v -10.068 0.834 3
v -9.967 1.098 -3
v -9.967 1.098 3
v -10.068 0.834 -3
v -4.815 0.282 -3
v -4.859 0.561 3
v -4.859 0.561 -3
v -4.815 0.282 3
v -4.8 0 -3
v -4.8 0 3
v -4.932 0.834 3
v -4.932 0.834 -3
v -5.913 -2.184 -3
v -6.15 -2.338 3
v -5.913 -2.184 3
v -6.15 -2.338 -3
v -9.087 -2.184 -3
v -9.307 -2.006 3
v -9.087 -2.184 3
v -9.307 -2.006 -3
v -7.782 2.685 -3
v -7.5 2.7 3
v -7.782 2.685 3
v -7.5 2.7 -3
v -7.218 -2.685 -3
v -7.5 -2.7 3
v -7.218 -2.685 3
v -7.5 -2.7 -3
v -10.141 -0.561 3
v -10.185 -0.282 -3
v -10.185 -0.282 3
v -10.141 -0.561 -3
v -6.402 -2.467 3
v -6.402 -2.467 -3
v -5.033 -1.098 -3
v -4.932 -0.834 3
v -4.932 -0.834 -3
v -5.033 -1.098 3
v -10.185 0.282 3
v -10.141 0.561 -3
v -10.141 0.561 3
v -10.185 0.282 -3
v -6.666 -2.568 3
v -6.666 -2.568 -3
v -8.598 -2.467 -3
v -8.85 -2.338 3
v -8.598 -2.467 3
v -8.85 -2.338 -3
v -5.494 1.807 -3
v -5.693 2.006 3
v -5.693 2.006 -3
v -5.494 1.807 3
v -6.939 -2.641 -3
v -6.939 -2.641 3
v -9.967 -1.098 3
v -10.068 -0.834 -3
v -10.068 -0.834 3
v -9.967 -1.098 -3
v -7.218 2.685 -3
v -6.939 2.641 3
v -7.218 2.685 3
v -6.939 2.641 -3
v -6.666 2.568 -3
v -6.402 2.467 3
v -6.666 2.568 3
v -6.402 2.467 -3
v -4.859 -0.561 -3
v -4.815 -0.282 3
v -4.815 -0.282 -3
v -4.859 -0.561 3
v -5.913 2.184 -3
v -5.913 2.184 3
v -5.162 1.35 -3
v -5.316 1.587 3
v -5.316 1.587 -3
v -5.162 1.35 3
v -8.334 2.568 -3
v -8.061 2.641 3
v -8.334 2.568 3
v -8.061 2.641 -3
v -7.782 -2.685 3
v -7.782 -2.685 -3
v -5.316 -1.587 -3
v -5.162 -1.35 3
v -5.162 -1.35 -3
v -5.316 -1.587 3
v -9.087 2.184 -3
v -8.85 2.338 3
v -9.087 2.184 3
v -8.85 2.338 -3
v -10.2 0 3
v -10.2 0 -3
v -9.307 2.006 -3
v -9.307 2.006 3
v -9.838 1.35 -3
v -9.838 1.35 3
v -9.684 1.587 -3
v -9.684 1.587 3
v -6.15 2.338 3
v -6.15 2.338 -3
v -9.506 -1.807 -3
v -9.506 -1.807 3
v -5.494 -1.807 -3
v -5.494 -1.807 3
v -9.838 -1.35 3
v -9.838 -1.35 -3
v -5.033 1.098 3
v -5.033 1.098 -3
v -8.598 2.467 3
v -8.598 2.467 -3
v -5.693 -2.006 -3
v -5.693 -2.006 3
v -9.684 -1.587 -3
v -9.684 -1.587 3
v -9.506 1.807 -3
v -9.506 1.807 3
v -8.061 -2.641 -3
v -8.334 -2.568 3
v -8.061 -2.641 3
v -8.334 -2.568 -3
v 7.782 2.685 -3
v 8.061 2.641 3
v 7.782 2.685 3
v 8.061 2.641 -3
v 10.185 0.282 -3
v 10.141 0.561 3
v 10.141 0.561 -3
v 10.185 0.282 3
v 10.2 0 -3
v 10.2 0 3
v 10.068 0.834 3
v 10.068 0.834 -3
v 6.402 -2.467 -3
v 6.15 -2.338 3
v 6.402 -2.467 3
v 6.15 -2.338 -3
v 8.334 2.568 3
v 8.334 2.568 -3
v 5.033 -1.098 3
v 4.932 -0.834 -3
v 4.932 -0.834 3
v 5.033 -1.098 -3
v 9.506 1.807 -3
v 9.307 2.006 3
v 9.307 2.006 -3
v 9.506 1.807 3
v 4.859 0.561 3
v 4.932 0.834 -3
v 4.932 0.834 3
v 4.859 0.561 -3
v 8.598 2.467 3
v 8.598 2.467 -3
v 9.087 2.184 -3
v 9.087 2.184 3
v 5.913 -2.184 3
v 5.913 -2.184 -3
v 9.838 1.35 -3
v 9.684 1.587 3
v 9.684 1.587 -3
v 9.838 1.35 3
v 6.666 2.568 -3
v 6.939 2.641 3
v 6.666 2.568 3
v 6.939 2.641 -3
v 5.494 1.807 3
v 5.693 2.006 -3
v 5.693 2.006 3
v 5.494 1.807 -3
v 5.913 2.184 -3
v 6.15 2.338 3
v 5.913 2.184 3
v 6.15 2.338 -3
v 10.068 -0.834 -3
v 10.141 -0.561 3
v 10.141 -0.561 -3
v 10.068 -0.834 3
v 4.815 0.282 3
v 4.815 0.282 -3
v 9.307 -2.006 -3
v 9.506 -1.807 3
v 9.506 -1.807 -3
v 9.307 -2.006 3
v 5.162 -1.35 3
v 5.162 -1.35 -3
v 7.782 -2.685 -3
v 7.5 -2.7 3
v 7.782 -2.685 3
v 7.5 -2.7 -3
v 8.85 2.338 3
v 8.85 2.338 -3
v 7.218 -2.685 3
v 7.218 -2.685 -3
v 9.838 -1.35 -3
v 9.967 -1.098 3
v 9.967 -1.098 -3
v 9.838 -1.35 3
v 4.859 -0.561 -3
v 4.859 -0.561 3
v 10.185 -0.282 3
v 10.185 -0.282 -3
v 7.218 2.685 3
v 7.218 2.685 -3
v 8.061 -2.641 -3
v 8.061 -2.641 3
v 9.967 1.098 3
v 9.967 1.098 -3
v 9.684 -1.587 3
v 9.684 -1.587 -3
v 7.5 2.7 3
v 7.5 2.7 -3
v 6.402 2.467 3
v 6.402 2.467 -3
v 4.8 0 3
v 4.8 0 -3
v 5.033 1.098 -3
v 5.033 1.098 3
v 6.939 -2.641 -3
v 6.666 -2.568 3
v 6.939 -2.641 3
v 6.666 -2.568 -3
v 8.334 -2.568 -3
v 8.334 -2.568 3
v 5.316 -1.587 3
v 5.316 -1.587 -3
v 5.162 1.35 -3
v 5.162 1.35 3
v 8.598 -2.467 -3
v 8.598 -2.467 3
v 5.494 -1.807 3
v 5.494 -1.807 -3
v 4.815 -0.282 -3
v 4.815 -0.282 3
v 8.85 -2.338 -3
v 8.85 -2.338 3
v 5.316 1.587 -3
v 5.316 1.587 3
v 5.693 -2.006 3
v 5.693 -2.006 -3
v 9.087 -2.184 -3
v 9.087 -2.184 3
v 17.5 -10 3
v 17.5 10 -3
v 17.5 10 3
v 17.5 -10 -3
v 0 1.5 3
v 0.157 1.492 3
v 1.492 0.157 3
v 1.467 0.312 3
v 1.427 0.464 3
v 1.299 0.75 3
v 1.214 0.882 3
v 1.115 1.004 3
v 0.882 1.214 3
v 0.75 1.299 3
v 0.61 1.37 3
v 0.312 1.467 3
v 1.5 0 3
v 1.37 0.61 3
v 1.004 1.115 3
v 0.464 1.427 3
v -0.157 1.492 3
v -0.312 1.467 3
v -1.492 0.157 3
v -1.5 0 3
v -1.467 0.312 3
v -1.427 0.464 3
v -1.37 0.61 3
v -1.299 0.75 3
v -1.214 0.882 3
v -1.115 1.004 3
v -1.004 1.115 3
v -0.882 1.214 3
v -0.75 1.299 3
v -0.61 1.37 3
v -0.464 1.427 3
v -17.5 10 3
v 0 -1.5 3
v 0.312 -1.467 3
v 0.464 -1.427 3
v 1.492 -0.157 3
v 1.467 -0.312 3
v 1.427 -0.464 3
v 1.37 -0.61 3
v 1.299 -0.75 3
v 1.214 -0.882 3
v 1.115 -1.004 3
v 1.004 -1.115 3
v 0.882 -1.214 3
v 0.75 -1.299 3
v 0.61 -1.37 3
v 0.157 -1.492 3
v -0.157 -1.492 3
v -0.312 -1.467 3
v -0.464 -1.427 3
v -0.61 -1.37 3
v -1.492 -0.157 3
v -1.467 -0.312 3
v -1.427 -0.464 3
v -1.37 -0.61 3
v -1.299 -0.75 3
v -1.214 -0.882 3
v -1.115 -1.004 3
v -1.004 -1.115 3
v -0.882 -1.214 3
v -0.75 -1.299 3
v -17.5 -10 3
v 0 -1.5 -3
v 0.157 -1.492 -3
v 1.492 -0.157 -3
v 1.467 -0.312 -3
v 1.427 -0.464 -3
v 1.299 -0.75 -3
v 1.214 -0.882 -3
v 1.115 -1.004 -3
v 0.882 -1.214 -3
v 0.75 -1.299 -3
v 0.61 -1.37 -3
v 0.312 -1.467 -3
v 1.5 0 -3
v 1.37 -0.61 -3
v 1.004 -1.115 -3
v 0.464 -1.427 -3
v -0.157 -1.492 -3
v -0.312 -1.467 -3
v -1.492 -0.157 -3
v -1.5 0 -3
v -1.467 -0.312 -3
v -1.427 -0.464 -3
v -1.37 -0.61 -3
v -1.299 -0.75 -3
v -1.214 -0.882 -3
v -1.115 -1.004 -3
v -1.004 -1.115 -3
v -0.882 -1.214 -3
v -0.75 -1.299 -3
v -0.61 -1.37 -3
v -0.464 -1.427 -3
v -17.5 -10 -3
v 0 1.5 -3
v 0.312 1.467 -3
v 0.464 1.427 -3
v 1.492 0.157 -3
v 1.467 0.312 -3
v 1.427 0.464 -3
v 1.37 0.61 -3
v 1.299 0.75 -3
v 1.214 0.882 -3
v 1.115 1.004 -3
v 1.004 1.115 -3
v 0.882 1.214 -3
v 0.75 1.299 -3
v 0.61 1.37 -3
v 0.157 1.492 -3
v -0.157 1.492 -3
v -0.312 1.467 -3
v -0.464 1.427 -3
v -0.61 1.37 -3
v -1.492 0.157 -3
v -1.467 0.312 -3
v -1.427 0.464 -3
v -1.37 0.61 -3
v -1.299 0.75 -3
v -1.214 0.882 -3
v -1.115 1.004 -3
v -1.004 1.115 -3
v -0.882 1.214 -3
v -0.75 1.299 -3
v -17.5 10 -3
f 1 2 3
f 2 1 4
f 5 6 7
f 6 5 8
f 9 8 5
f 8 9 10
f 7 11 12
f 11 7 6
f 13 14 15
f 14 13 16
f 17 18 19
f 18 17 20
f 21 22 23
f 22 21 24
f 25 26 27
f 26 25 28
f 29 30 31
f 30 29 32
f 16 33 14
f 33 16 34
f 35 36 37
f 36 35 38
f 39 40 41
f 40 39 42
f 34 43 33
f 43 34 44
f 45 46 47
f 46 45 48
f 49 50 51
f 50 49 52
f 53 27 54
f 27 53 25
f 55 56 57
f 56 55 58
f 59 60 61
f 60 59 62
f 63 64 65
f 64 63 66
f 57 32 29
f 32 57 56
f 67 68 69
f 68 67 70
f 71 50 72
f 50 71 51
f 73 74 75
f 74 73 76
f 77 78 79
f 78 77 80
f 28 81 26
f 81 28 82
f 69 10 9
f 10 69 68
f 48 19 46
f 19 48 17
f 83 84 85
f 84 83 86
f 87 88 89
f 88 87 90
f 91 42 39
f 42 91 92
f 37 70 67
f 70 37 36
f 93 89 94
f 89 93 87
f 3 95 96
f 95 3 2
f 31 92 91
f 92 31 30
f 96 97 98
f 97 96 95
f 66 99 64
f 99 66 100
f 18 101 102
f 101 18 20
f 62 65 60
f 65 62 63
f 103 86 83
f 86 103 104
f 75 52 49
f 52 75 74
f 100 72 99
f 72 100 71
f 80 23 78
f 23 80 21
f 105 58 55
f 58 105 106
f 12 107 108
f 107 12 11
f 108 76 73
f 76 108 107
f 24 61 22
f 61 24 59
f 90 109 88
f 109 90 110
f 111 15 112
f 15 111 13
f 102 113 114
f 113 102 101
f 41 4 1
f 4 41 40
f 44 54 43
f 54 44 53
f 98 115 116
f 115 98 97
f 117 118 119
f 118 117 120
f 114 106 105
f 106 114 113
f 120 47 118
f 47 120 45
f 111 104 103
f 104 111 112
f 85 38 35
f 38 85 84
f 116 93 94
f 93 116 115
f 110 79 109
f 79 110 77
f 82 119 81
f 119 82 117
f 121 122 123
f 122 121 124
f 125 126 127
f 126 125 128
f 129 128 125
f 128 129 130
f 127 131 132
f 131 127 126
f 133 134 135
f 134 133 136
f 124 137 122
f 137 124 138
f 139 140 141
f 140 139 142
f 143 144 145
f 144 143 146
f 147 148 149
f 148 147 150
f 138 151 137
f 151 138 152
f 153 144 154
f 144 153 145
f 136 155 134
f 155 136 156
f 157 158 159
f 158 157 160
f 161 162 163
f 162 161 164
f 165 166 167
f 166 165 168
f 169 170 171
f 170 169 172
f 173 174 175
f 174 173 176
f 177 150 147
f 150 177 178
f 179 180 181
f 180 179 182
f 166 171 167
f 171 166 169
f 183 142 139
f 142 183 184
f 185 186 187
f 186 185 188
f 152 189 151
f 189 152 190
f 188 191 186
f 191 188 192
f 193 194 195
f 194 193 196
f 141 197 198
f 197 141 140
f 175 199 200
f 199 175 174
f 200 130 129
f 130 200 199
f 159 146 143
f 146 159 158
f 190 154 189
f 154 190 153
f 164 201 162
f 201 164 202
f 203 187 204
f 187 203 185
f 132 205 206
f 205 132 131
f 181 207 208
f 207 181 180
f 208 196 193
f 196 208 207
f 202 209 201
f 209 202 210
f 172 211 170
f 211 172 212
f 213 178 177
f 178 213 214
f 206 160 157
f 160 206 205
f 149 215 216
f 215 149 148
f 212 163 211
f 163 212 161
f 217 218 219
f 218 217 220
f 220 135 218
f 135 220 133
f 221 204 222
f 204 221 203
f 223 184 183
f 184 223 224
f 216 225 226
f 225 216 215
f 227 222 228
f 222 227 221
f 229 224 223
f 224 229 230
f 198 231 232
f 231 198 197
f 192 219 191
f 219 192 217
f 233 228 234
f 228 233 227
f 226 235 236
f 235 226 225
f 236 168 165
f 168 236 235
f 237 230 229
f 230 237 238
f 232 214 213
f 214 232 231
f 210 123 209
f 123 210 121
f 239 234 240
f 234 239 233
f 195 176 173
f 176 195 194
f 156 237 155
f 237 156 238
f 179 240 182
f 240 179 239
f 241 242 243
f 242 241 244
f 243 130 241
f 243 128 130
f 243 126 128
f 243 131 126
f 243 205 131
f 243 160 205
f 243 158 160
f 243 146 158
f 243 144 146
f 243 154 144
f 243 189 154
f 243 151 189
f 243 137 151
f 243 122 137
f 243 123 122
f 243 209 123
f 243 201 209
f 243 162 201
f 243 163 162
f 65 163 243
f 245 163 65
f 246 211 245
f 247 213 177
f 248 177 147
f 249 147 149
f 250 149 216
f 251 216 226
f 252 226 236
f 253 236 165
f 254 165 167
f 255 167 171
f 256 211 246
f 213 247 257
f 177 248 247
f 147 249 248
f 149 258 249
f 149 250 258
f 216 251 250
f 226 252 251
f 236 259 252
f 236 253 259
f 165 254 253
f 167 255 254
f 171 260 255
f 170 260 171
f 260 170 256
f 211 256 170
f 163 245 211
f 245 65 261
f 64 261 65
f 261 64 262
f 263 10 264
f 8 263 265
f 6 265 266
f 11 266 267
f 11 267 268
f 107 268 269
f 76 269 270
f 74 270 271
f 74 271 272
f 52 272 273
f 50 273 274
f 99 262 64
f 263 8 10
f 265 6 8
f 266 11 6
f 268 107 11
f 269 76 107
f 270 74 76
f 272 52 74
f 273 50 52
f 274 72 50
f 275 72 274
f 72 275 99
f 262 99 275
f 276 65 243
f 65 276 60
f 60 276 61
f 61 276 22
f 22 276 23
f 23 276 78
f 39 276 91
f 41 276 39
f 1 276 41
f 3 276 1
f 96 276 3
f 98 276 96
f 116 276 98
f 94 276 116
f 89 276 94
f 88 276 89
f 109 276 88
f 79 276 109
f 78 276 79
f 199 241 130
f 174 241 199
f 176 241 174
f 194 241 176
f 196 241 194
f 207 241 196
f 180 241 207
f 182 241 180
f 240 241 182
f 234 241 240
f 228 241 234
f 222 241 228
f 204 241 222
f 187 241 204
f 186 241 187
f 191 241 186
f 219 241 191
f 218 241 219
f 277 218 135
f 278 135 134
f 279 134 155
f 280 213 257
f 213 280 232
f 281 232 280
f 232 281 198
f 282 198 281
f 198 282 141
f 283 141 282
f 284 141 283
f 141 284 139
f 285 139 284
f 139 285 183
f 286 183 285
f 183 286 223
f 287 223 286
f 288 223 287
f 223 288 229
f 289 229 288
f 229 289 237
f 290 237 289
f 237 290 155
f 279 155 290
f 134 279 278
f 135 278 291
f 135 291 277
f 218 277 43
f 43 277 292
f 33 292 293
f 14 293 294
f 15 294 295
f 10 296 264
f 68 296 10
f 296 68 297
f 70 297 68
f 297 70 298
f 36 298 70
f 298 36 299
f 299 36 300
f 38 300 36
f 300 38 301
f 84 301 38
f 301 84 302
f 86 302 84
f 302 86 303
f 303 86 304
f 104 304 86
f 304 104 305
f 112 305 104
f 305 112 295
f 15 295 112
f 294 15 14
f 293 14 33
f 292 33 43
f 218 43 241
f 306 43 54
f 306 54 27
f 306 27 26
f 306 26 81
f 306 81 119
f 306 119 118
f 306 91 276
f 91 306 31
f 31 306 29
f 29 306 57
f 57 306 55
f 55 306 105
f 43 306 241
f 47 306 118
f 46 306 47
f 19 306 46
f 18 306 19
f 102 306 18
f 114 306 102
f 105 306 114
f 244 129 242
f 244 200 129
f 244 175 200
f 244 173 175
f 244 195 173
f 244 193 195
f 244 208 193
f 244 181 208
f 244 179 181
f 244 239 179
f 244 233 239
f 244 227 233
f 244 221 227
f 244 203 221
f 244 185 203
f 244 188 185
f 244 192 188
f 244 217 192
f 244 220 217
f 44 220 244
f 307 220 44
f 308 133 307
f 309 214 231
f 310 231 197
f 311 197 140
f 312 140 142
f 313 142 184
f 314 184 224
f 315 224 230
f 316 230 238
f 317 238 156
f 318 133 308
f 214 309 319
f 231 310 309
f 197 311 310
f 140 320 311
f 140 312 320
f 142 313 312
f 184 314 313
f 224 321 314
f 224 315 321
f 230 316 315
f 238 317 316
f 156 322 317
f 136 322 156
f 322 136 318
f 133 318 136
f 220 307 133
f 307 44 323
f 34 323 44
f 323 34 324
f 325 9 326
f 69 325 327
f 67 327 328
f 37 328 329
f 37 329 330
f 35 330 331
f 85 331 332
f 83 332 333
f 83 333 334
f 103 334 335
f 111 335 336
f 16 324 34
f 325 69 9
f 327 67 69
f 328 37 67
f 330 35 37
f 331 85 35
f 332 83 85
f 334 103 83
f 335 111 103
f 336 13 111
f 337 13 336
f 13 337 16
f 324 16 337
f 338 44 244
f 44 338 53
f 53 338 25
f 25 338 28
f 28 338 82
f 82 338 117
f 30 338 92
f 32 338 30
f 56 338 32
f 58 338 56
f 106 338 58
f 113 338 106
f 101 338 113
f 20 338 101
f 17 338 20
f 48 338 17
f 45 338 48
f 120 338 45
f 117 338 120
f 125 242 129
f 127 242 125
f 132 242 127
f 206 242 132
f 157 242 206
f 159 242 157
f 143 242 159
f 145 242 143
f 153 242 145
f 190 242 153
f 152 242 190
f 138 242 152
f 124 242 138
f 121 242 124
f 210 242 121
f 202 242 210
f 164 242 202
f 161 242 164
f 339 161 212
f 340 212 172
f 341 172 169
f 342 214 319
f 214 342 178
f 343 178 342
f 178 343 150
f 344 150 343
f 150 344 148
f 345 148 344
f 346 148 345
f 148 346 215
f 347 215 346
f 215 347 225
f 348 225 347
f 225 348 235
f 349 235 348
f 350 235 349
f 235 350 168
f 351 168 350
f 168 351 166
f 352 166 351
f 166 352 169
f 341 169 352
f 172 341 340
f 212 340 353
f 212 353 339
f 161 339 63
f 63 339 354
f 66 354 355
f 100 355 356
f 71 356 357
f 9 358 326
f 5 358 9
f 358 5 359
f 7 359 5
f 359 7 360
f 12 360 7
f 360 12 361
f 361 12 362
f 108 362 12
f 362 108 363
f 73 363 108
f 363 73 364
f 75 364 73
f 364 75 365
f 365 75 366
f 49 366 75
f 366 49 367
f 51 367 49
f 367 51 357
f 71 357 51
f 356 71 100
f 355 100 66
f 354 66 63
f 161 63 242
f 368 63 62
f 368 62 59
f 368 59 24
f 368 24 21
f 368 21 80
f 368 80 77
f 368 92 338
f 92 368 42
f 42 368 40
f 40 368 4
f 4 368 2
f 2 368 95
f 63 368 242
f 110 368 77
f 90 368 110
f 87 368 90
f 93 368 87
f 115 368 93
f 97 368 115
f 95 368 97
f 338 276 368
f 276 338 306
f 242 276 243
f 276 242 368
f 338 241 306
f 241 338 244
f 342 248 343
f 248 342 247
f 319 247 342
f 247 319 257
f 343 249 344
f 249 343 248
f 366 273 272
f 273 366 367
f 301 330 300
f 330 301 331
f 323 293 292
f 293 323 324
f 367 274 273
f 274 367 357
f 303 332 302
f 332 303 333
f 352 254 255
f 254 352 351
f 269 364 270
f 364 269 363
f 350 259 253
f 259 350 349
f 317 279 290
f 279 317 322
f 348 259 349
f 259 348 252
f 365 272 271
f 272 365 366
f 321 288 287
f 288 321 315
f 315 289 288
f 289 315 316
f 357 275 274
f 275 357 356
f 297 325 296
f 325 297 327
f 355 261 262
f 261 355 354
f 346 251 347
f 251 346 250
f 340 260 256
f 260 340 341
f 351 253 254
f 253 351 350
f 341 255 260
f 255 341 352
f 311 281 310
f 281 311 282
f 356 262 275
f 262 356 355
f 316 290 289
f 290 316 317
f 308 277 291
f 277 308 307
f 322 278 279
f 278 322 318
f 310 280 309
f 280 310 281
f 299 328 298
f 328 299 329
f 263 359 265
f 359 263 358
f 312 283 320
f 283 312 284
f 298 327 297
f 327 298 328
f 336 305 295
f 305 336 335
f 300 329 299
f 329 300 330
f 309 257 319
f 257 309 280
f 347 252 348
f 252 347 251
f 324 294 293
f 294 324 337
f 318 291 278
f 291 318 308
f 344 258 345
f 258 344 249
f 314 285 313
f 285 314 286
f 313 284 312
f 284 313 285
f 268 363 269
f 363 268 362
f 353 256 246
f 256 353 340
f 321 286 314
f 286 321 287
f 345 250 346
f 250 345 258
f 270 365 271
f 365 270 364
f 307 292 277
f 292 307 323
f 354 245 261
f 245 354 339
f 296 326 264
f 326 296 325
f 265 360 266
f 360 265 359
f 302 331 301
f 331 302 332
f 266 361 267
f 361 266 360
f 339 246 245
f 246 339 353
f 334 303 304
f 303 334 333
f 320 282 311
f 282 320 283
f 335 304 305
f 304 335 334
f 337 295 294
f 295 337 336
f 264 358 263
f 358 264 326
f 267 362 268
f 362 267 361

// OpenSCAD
// Rod-end mounting plate.
$fn = 60;
eps = 0.02;
plate_l = 35;
plate_w = 20;
plate_t = 6;
bore_d = 3;
difference() {
    cube([plate_l, plate_w, plate_t], center = true);
    translate([0, 0, -plate_t / 2 - eps]) cylinder(d = bore_d, h = plate_t + 2 * eps);
    for (x = [-plate_l / 2 + 10, plate_l / 2 - 10])
        translate([x, 0, -plate_t / 2 - eps]) cylinder(d = 5.4, h = plate_t + 2 * eps);
}
